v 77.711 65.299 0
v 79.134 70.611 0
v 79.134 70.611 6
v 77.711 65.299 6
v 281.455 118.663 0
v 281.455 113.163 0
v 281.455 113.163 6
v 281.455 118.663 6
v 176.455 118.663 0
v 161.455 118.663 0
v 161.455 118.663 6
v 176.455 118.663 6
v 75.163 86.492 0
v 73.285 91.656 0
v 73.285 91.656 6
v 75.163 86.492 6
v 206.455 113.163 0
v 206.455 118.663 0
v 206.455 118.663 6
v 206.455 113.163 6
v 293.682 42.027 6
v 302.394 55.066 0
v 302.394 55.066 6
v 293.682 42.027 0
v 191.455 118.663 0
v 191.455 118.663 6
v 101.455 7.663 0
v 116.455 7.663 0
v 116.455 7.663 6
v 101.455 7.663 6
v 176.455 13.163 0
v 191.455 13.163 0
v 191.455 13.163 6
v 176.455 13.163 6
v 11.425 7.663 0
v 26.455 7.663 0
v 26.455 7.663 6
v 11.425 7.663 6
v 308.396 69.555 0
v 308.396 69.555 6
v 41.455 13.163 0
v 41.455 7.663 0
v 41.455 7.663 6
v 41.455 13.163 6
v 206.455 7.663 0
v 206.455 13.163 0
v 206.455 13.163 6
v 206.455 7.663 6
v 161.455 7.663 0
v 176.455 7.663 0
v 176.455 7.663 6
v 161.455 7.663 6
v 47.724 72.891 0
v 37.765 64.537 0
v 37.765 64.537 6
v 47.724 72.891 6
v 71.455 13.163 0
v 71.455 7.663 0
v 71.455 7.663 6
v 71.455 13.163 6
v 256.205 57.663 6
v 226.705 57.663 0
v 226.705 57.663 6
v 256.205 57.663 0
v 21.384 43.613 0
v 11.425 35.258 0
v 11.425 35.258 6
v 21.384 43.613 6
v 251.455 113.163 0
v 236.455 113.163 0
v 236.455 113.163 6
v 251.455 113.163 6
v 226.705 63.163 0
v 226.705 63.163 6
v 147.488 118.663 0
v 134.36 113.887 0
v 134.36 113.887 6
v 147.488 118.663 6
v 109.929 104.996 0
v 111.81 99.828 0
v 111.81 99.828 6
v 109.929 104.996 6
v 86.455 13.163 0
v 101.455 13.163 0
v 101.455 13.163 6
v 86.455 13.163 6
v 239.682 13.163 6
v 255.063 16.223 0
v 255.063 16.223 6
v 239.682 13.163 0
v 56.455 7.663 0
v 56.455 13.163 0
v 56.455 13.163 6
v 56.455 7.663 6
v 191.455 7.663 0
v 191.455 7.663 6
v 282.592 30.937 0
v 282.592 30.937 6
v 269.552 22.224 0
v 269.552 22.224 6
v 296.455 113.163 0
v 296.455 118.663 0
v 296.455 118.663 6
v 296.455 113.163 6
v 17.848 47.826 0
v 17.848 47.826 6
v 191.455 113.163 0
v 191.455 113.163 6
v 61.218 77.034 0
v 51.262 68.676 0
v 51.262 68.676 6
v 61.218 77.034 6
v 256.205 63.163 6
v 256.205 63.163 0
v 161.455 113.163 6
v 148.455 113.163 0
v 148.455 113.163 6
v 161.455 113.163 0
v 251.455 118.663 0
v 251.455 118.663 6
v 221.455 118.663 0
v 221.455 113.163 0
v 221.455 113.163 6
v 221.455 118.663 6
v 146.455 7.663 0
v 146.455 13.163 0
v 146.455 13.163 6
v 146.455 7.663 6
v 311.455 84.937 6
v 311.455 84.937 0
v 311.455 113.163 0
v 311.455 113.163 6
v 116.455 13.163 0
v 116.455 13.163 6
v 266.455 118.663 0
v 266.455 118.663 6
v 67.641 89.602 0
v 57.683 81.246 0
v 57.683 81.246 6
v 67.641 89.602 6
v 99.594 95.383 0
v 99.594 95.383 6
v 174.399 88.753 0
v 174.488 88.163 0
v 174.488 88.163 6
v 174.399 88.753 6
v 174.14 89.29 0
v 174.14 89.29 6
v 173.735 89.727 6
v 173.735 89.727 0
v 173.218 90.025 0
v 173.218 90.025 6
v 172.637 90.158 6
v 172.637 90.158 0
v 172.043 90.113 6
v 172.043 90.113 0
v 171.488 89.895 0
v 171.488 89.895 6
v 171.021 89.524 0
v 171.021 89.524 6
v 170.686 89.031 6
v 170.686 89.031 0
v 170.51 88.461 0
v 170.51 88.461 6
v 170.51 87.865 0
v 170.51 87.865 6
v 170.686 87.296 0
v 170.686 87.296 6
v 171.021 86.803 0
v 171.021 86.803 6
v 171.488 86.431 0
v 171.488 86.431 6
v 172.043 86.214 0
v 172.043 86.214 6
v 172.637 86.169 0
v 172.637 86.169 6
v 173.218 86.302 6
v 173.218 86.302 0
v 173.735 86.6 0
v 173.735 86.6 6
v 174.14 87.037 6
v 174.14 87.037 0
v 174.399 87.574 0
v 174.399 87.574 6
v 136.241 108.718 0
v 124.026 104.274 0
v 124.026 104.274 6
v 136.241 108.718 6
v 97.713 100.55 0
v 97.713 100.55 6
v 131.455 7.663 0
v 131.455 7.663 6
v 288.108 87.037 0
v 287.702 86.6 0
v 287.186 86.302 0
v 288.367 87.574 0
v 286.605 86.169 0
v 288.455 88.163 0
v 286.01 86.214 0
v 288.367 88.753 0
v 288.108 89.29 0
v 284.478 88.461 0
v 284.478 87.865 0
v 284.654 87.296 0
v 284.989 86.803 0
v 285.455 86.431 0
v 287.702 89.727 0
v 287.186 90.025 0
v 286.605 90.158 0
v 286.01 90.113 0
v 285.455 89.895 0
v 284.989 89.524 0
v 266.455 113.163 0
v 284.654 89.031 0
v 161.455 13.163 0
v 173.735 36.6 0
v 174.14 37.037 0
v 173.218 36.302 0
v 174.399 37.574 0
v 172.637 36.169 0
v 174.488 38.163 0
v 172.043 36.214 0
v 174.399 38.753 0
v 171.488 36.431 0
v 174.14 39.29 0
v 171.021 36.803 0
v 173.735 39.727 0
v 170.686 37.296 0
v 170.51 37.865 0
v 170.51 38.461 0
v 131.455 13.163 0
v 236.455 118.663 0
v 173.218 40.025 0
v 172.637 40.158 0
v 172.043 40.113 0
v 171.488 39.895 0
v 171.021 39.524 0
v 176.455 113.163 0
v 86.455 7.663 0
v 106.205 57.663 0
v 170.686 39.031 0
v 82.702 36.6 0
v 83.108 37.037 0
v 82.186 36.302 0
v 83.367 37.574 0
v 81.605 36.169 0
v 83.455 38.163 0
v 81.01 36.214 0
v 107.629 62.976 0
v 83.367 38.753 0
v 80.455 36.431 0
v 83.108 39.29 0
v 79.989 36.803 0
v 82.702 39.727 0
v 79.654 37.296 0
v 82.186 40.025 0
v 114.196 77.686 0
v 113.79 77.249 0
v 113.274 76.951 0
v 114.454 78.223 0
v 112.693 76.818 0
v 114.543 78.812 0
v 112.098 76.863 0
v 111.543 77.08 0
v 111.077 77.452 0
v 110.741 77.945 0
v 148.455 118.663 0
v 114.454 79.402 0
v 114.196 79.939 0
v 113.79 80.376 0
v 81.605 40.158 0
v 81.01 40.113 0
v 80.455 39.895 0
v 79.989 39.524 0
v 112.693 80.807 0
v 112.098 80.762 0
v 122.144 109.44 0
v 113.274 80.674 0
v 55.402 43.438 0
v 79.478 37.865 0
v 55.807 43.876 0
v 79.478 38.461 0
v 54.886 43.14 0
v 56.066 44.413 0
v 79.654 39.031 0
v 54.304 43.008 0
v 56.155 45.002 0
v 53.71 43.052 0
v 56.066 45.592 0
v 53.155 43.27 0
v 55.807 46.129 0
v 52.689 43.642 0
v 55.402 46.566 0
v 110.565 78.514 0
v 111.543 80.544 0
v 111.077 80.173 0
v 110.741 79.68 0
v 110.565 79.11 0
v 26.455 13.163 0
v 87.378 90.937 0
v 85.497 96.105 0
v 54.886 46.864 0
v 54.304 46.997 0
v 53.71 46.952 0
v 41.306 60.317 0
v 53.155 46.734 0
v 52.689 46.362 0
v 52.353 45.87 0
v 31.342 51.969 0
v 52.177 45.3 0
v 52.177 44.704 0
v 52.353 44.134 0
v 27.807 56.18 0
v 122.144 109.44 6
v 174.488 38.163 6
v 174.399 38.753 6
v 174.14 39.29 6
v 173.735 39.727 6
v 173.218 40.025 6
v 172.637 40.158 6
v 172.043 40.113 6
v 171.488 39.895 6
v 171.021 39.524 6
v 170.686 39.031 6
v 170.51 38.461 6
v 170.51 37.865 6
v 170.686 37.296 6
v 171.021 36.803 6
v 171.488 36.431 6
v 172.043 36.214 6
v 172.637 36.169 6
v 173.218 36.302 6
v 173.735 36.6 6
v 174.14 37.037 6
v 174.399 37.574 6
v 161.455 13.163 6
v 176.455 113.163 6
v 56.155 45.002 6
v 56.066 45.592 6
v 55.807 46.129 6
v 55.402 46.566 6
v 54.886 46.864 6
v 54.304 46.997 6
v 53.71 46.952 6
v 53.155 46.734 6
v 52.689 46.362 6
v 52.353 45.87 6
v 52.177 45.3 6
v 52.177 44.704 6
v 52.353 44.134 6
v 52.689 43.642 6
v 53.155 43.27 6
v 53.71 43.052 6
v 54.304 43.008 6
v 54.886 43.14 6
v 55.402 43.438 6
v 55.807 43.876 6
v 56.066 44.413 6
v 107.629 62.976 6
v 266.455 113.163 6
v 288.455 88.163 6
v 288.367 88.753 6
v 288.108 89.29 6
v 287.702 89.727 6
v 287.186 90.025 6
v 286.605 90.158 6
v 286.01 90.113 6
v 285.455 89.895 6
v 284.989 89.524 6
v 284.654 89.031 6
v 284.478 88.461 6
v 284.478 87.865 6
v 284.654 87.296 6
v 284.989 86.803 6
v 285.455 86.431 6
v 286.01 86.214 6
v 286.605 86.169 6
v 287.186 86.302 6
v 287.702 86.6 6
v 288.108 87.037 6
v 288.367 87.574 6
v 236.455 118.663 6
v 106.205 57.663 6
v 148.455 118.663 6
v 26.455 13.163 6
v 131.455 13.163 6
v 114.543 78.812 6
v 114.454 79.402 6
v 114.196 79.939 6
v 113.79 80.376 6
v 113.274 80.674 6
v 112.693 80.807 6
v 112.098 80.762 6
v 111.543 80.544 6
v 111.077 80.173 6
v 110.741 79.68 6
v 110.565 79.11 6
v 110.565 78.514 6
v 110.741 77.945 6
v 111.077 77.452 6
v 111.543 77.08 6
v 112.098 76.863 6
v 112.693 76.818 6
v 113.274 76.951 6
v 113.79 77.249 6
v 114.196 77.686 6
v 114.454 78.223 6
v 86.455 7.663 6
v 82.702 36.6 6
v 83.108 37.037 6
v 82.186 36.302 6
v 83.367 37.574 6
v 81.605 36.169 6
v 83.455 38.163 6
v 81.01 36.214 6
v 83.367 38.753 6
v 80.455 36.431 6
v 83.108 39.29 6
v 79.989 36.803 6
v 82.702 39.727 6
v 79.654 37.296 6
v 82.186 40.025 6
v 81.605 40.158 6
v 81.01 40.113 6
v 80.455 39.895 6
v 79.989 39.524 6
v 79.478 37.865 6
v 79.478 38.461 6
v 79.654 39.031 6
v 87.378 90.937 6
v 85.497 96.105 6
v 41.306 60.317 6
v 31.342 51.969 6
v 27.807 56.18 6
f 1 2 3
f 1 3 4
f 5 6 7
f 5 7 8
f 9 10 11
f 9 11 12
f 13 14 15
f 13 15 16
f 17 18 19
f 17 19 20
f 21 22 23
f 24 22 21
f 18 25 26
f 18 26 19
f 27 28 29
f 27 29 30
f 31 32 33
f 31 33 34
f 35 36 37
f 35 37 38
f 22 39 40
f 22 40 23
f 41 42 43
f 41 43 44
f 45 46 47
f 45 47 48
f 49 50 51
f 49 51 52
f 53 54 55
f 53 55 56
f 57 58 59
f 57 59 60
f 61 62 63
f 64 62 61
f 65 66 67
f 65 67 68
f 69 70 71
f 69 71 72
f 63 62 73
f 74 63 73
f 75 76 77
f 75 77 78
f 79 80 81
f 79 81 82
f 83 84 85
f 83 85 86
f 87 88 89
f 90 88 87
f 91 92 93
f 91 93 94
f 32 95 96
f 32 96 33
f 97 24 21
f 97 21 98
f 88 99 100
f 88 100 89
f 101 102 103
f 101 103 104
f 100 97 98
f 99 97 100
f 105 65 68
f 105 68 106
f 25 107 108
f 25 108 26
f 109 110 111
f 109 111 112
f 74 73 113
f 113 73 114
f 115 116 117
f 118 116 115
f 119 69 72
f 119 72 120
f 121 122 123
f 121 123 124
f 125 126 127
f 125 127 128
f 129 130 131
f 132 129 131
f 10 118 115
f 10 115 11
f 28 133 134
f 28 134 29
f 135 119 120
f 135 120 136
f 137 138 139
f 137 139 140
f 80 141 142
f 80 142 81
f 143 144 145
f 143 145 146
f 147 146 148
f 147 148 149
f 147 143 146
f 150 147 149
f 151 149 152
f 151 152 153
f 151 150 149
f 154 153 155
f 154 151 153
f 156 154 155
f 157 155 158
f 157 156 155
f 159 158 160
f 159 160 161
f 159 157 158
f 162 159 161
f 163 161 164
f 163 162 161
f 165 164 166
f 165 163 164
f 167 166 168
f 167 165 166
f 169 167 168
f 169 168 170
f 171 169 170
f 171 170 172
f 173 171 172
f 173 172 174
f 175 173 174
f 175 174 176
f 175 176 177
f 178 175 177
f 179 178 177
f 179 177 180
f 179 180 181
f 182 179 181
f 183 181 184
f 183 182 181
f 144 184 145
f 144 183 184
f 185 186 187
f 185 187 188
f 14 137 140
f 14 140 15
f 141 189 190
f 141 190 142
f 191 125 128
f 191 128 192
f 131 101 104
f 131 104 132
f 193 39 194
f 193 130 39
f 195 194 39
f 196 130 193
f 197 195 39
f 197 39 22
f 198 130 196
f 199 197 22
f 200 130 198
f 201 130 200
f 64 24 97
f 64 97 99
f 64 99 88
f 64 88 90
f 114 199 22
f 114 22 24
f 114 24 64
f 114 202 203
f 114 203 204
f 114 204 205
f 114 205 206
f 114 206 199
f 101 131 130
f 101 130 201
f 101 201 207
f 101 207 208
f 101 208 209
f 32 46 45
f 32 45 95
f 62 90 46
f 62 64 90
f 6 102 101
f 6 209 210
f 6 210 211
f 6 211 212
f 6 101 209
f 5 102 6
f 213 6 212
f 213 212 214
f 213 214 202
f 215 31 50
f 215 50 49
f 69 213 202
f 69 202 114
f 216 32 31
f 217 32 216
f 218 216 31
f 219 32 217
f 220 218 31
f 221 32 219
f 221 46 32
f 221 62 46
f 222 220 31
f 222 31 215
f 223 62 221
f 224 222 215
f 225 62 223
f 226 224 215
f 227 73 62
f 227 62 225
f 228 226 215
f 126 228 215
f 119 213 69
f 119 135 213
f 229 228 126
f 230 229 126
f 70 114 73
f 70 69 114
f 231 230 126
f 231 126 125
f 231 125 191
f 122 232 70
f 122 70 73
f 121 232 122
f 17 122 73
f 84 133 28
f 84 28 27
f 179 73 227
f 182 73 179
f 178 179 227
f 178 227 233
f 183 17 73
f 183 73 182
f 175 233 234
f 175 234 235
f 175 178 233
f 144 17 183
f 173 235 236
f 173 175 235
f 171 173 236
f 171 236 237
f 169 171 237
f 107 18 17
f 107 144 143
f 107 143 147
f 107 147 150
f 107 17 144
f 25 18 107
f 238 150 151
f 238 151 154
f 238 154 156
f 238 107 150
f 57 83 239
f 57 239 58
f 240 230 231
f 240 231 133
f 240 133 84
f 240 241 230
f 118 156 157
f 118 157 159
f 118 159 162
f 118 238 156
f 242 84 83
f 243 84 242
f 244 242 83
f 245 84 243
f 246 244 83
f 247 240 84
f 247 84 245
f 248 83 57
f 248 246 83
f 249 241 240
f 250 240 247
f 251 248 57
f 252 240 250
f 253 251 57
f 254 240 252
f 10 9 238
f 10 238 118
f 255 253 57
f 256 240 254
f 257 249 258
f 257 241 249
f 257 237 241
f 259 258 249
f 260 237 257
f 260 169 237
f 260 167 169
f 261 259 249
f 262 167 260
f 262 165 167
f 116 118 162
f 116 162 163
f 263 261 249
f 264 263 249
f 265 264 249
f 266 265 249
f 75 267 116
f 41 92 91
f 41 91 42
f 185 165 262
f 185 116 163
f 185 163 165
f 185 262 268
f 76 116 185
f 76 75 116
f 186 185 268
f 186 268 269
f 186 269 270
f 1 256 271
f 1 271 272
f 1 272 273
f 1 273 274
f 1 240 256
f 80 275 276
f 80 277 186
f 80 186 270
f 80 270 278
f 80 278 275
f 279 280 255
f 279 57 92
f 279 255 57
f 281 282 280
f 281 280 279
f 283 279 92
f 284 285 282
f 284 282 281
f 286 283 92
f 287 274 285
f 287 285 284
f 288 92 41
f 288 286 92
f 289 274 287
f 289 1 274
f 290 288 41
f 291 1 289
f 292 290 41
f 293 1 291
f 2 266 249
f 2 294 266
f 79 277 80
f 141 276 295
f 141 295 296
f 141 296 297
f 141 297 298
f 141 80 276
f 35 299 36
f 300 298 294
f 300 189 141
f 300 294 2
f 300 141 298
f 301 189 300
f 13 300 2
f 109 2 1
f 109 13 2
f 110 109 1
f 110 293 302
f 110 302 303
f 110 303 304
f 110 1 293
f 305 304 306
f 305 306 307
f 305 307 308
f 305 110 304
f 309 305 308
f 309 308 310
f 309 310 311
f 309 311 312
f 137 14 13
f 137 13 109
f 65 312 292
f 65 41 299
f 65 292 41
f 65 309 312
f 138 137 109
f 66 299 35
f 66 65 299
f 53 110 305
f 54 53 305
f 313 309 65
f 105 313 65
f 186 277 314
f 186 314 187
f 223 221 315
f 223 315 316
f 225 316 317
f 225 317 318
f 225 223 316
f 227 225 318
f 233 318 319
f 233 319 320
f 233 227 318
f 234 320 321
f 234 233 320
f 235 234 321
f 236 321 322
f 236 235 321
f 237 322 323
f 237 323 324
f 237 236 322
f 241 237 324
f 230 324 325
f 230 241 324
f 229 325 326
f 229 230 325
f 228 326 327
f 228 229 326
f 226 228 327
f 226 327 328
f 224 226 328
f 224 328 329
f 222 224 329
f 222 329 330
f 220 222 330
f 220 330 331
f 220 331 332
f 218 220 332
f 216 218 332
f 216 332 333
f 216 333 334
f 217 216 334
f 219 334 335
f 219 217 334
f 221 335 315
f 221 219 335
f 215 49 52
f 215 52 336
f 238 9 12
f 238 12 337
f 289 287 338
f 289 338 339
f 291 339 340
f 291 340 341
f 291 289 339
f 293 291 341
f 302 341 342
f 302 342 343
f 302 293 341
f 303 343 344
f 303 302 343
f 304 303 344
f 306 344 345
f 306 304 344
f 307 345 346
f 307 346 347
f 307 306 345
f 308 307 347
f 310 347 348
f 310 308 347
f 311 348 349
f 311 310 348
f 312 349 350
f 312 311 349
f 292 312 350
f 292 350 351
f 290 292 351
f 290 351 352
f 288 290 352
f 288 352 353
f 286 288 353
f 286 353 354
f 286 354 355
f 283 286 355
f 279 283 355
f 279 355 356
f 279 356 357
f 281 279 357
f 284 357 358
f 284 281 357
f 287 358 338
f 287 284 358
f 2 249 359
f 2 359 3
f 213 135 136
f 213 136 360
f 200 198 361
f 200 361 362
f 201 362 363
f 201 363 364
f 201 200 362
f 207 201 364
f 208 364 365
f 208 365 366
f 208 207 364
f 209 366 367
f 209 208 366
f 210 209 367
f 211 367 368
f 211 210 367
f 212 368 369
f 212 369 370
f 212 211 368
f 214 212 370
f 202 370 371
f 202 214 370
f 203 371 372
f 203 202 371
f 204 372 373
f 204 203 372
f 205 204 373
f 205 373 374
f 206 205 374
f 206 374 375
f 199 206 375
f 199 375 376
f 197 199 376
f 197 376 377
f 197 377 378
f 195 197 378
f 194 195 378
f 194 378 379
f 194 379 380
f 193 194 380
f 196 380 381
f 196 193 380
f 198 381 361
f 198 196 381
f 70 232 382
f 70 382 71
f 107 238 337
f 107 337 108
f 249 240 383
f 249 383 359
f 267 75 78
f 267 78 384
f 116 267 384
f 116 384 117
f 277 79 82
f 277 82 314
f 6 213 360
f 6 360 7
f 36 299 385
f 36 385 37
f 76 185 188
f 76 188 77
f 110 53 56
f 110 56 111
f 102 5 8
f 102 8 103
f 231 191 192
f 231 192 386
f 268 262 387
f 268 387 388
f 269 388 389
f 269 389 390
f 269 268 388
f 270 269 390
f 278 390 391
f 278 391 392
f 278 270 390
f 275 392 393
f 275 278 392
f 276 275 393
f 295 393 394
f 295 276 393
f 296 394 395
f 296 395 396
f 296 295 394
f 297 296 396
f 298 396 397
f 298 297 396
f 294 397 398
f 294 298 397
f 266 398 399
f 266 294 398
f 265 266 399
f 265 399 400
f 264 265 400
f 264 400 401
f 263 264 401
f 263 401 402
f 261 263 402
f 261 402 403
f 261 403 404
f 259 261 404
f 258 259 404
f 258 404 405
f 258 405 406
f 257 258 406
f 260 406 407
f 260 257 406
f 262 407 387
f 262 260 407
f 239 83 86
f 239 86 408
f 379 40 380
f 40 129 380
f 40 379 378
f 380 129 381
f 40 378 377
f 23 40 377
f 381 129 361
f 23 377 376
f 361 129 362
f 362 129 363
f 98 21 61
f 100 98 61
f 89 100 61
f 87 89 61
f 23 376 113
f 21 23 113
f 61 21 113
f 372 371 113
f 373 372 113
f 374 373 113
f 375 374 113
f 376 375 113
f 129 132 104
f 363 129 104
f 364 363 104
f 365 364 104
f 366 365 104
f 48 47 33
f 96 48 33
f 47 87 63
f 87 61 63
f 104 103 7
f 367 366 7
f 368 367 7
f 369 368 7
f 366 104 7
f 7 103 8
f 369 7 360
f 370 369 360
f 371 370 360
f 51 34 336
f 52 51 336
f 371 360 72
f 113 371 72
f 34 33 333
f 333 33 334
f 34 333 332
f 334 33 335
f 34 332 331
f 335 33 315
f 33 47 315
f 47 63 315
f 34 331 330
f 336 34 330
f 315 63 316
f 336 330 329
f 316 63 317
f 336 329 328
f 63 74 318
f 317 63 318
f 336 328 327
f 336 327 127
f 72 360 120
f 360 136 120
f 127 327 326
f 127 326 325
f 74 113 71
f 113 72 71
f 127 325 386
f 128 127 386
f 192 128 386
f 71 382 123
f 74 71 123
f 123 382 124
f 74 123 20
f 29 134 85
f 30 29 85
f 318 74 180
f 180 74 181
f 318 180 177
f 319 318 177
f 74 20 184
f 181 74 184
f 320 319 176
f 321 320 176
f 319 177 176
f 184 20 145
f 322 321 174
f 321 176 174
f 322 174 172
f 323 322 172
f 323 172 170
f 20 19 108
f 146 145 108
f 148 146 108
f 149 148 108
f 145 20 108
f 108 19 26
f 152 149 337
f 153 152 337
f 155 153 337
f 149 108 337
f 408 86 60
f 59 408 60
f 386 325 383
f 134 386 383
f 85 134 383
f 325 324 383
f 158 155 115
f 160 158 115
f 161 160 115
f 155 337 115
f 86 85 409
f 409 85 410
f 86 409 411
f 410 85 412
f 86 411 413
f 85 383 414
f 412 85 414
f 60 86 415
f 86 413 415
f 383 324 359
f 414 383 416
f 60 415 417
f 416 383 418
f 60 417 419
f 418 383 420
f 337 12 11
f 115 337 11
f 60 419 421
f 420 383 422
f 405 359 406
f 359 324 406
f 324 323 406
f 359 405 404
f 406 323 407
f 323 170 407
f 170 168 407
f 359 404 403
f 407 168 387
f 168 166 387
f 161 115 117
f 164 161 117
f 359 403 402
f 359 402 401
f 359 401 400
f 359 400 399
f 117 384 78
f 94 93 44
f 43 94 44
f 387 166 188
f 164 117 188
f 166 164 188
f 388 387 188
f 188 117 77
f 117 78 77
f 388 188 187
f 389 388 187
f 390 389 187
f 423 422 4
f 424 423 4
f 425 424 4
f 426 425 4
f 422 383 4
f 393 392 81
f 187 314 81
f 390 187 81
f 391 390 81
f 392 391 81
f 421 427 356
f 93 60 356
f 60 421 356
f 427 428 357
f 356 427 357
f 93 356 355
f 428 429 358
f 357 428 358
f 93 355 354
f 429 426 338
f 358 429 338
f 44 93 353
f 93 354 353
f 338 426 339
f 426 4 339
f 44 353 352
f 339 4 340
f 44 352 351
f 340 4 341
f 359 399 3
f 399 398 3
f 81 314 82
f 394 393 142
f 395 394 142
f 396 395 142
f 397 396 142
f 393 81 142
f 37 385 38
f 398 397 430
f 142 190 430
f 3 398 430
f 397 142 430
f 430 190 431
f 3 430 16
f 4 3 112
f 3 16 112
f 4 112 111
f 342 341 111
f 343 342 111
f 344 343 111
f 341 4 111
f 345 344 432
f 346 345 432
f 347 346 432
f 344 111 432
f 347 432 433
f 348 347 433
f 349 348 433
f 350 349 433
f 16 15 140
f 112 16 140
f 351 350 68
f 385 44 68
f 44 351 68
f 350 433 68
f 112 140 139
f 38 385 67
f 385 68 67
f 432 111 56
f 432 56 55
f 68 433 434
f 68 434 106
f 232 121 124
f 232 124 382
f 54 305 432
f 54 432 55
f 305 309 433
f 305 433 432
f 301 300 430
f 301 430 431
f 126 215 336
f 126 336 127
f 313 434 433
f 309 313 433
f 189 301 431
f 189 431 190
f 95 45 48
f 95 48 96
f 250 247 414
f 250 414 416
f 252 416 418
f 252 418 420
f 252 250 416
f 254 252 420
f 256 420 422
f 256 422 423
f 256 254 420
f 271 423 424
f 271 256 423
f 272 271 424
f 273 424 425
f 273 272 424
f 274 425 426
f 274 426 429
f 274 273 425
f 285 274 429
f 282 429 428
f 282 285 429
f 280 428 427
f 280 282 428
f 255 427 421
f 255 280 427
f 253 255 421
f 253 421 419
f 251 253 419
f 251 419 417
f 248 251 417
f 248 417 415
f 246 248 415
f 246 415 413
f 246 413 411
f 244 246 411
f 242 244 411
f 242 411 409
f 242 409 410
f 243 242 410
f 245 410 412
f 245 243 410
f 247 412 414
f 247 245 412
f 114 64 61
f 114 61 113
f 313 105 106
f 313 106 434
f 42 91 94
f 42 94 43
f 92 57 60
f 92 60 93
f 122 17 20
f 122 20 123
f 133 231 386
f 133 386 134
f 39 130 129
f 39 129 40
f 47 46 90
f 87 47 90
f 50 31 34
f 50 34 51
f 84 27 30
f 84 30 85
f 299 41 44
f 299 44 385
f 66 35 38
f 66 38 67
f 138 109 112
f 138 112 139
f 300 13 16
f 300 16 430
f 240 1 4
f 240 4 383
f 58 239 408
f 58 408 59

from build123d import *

# Parameters (mm, degrees)
MODEL_R             = 2
MODEL_W             = 29.5
MODEL_H             = 5.5
BOSS_EXTRUDE1_DEPTH = 6


with BuildPart() as part:
    # Model → Boss-Extrude1 (new body)
    with BuildSketch(Plane.XY):
        Polygon((41.305703545, 60.317480411), (37.765395693, 64.536655013), (47.723769702, 72.891019085), (51.262213555, 68.676185328), (61.217679315, 77.034013574), (57.683186462, 81.246258129), (67.640721471, 89.601622083), (73.284512173, 91.655793907), (75.16331879, 86.492201925), (87.378490159, 90.936771689), (85.497379371, 96.105081103), (97.712550739, 100.549650868), (99.594494229, 95.383033552), (111.809665598, 99.827603316), (109.92855481, 104.995912731), (122.143726178, 109.440482495), (124.025669668, 104.27386518), (136.240841037, 108.718434944), (134.359730249, 113.886744358), (147.487562001, 118.663391555), (148.455483892, 118.663391555), (148.455483892, 113.163391555), (161.455483892, 113.163391555), (161.455483892, 118.663391555), (176.455483892, 118.663391555), (176.455483892, 113.163391555), (191.455483892, 113.163391555), (191.455483892, 118.663391555), (206.455483892, 118.663391555), (206.455483892, 113.163391555), (221.455483892, 113.163391555), (221.455483892, 118.663391555), (236.455483892, 118.663391555), (236.455483892, 113.163391555), (251.455483892, 113.163391555), (251.455483892, 118.663391555), (266.455483892, 118.663391555), (266.455483892, 113.163391555), (281.455483892, 113.163391555), (281.455483892, 118.663391555), (296.455483892, 118.663391555), (296.455483892, 113.163391555), (311.455483892, 113.163391555), (311.455483892, 100.619540915), (311.455483892, 84.936798462), (308.395932616, 69.555395508), (302.394406906, 55.066430742), (293.681542027, 42.026706955), (282.592168491, 30.937333419), (269.552444704, 22.224468541), (255.063479938, 16.22294283), (239.682076984, 13.163391555), (236.455483892, 13.163391555), (221.455483892, 13.163391555), (206.455483892, 13.163391555), (206.455483892, 7.663391555), (191.455483892, 7.663391555), (191.455483892, 13.163391555), (176.455483892, 13.163391555), (176.455483892, 7.663391555), (161.455483892, 7.663391555), (161.455483892, 13.163391555), (146.455483892, 13.163391555), (146.455483892, 7.663391555), (131.455483892, 7.663391555), (131.455483892, 13.163391555), (116.455483892, 13.163391555), (116.455483892, 7.663391555), (101.455483892, 7.663391555), (101.455483892, 13.163391555), (86.455483892, 13.163391555), (86.455483892, 7.663391555), (71.455483892, 7.663391555), (71.455483892, 13.163391555), (56.455483892, 13.163391555), (56.455483892, 7.663391555), (41.455483892, 7.663391555), (41.455483892, 13.163391555), (26.455483892, 13.163391555), (26.455483892, 7.663391555), (11.425401767, 7.663391555), (11.425401767, 35.258443505), (21.383775776, 43.612807577), (17.848443923, 47.826052014), (27.806817932, 56.180416087), (31.342353537, 51.969046503), align=None)
        with Locations((172.487562001, 88.163391555)):
            Circle(MODEL_R, mode=Mode.SUBTRACT)
        with Locations((286.455483892, 88.163391555)):
            Circle(MODEL_R, mode=Mode.SUBTRACT)
        with Locations((81.455483892, 38.163391555)):
            Circle(MODEL_R, mode=Mode.SUBTRACT)
        with Locations((172.487562001, 38.163391555)):
            Circle(MODEL_R, mode=Mode.SUBTRACT)
        with Locations((112.543046266, 78.812365745)):
            Circle(MODEL_R, mode=Mode.SUBTRACT)
        with Locations((54.155009637, 45.002140534)):
            Circle(MODEL_R, mode=Mode.SUBTRACT)
        with Locations((241.455483892, 60.413391555)):
            Rectangle(MODEL_W, MODEL_H, mode=Mode.SUBTRACT)
        Polygon((107.62898864, 62.975983599), (79.134176764, 70.61114543), (77.710672016, 65.298553385), (106.205483892, 57.663391555), align=None, mode=Mode.SUBTRACT)
    extrude(amount=BOSS_EXTRUDE1_DEPTH)


solid = part.part
